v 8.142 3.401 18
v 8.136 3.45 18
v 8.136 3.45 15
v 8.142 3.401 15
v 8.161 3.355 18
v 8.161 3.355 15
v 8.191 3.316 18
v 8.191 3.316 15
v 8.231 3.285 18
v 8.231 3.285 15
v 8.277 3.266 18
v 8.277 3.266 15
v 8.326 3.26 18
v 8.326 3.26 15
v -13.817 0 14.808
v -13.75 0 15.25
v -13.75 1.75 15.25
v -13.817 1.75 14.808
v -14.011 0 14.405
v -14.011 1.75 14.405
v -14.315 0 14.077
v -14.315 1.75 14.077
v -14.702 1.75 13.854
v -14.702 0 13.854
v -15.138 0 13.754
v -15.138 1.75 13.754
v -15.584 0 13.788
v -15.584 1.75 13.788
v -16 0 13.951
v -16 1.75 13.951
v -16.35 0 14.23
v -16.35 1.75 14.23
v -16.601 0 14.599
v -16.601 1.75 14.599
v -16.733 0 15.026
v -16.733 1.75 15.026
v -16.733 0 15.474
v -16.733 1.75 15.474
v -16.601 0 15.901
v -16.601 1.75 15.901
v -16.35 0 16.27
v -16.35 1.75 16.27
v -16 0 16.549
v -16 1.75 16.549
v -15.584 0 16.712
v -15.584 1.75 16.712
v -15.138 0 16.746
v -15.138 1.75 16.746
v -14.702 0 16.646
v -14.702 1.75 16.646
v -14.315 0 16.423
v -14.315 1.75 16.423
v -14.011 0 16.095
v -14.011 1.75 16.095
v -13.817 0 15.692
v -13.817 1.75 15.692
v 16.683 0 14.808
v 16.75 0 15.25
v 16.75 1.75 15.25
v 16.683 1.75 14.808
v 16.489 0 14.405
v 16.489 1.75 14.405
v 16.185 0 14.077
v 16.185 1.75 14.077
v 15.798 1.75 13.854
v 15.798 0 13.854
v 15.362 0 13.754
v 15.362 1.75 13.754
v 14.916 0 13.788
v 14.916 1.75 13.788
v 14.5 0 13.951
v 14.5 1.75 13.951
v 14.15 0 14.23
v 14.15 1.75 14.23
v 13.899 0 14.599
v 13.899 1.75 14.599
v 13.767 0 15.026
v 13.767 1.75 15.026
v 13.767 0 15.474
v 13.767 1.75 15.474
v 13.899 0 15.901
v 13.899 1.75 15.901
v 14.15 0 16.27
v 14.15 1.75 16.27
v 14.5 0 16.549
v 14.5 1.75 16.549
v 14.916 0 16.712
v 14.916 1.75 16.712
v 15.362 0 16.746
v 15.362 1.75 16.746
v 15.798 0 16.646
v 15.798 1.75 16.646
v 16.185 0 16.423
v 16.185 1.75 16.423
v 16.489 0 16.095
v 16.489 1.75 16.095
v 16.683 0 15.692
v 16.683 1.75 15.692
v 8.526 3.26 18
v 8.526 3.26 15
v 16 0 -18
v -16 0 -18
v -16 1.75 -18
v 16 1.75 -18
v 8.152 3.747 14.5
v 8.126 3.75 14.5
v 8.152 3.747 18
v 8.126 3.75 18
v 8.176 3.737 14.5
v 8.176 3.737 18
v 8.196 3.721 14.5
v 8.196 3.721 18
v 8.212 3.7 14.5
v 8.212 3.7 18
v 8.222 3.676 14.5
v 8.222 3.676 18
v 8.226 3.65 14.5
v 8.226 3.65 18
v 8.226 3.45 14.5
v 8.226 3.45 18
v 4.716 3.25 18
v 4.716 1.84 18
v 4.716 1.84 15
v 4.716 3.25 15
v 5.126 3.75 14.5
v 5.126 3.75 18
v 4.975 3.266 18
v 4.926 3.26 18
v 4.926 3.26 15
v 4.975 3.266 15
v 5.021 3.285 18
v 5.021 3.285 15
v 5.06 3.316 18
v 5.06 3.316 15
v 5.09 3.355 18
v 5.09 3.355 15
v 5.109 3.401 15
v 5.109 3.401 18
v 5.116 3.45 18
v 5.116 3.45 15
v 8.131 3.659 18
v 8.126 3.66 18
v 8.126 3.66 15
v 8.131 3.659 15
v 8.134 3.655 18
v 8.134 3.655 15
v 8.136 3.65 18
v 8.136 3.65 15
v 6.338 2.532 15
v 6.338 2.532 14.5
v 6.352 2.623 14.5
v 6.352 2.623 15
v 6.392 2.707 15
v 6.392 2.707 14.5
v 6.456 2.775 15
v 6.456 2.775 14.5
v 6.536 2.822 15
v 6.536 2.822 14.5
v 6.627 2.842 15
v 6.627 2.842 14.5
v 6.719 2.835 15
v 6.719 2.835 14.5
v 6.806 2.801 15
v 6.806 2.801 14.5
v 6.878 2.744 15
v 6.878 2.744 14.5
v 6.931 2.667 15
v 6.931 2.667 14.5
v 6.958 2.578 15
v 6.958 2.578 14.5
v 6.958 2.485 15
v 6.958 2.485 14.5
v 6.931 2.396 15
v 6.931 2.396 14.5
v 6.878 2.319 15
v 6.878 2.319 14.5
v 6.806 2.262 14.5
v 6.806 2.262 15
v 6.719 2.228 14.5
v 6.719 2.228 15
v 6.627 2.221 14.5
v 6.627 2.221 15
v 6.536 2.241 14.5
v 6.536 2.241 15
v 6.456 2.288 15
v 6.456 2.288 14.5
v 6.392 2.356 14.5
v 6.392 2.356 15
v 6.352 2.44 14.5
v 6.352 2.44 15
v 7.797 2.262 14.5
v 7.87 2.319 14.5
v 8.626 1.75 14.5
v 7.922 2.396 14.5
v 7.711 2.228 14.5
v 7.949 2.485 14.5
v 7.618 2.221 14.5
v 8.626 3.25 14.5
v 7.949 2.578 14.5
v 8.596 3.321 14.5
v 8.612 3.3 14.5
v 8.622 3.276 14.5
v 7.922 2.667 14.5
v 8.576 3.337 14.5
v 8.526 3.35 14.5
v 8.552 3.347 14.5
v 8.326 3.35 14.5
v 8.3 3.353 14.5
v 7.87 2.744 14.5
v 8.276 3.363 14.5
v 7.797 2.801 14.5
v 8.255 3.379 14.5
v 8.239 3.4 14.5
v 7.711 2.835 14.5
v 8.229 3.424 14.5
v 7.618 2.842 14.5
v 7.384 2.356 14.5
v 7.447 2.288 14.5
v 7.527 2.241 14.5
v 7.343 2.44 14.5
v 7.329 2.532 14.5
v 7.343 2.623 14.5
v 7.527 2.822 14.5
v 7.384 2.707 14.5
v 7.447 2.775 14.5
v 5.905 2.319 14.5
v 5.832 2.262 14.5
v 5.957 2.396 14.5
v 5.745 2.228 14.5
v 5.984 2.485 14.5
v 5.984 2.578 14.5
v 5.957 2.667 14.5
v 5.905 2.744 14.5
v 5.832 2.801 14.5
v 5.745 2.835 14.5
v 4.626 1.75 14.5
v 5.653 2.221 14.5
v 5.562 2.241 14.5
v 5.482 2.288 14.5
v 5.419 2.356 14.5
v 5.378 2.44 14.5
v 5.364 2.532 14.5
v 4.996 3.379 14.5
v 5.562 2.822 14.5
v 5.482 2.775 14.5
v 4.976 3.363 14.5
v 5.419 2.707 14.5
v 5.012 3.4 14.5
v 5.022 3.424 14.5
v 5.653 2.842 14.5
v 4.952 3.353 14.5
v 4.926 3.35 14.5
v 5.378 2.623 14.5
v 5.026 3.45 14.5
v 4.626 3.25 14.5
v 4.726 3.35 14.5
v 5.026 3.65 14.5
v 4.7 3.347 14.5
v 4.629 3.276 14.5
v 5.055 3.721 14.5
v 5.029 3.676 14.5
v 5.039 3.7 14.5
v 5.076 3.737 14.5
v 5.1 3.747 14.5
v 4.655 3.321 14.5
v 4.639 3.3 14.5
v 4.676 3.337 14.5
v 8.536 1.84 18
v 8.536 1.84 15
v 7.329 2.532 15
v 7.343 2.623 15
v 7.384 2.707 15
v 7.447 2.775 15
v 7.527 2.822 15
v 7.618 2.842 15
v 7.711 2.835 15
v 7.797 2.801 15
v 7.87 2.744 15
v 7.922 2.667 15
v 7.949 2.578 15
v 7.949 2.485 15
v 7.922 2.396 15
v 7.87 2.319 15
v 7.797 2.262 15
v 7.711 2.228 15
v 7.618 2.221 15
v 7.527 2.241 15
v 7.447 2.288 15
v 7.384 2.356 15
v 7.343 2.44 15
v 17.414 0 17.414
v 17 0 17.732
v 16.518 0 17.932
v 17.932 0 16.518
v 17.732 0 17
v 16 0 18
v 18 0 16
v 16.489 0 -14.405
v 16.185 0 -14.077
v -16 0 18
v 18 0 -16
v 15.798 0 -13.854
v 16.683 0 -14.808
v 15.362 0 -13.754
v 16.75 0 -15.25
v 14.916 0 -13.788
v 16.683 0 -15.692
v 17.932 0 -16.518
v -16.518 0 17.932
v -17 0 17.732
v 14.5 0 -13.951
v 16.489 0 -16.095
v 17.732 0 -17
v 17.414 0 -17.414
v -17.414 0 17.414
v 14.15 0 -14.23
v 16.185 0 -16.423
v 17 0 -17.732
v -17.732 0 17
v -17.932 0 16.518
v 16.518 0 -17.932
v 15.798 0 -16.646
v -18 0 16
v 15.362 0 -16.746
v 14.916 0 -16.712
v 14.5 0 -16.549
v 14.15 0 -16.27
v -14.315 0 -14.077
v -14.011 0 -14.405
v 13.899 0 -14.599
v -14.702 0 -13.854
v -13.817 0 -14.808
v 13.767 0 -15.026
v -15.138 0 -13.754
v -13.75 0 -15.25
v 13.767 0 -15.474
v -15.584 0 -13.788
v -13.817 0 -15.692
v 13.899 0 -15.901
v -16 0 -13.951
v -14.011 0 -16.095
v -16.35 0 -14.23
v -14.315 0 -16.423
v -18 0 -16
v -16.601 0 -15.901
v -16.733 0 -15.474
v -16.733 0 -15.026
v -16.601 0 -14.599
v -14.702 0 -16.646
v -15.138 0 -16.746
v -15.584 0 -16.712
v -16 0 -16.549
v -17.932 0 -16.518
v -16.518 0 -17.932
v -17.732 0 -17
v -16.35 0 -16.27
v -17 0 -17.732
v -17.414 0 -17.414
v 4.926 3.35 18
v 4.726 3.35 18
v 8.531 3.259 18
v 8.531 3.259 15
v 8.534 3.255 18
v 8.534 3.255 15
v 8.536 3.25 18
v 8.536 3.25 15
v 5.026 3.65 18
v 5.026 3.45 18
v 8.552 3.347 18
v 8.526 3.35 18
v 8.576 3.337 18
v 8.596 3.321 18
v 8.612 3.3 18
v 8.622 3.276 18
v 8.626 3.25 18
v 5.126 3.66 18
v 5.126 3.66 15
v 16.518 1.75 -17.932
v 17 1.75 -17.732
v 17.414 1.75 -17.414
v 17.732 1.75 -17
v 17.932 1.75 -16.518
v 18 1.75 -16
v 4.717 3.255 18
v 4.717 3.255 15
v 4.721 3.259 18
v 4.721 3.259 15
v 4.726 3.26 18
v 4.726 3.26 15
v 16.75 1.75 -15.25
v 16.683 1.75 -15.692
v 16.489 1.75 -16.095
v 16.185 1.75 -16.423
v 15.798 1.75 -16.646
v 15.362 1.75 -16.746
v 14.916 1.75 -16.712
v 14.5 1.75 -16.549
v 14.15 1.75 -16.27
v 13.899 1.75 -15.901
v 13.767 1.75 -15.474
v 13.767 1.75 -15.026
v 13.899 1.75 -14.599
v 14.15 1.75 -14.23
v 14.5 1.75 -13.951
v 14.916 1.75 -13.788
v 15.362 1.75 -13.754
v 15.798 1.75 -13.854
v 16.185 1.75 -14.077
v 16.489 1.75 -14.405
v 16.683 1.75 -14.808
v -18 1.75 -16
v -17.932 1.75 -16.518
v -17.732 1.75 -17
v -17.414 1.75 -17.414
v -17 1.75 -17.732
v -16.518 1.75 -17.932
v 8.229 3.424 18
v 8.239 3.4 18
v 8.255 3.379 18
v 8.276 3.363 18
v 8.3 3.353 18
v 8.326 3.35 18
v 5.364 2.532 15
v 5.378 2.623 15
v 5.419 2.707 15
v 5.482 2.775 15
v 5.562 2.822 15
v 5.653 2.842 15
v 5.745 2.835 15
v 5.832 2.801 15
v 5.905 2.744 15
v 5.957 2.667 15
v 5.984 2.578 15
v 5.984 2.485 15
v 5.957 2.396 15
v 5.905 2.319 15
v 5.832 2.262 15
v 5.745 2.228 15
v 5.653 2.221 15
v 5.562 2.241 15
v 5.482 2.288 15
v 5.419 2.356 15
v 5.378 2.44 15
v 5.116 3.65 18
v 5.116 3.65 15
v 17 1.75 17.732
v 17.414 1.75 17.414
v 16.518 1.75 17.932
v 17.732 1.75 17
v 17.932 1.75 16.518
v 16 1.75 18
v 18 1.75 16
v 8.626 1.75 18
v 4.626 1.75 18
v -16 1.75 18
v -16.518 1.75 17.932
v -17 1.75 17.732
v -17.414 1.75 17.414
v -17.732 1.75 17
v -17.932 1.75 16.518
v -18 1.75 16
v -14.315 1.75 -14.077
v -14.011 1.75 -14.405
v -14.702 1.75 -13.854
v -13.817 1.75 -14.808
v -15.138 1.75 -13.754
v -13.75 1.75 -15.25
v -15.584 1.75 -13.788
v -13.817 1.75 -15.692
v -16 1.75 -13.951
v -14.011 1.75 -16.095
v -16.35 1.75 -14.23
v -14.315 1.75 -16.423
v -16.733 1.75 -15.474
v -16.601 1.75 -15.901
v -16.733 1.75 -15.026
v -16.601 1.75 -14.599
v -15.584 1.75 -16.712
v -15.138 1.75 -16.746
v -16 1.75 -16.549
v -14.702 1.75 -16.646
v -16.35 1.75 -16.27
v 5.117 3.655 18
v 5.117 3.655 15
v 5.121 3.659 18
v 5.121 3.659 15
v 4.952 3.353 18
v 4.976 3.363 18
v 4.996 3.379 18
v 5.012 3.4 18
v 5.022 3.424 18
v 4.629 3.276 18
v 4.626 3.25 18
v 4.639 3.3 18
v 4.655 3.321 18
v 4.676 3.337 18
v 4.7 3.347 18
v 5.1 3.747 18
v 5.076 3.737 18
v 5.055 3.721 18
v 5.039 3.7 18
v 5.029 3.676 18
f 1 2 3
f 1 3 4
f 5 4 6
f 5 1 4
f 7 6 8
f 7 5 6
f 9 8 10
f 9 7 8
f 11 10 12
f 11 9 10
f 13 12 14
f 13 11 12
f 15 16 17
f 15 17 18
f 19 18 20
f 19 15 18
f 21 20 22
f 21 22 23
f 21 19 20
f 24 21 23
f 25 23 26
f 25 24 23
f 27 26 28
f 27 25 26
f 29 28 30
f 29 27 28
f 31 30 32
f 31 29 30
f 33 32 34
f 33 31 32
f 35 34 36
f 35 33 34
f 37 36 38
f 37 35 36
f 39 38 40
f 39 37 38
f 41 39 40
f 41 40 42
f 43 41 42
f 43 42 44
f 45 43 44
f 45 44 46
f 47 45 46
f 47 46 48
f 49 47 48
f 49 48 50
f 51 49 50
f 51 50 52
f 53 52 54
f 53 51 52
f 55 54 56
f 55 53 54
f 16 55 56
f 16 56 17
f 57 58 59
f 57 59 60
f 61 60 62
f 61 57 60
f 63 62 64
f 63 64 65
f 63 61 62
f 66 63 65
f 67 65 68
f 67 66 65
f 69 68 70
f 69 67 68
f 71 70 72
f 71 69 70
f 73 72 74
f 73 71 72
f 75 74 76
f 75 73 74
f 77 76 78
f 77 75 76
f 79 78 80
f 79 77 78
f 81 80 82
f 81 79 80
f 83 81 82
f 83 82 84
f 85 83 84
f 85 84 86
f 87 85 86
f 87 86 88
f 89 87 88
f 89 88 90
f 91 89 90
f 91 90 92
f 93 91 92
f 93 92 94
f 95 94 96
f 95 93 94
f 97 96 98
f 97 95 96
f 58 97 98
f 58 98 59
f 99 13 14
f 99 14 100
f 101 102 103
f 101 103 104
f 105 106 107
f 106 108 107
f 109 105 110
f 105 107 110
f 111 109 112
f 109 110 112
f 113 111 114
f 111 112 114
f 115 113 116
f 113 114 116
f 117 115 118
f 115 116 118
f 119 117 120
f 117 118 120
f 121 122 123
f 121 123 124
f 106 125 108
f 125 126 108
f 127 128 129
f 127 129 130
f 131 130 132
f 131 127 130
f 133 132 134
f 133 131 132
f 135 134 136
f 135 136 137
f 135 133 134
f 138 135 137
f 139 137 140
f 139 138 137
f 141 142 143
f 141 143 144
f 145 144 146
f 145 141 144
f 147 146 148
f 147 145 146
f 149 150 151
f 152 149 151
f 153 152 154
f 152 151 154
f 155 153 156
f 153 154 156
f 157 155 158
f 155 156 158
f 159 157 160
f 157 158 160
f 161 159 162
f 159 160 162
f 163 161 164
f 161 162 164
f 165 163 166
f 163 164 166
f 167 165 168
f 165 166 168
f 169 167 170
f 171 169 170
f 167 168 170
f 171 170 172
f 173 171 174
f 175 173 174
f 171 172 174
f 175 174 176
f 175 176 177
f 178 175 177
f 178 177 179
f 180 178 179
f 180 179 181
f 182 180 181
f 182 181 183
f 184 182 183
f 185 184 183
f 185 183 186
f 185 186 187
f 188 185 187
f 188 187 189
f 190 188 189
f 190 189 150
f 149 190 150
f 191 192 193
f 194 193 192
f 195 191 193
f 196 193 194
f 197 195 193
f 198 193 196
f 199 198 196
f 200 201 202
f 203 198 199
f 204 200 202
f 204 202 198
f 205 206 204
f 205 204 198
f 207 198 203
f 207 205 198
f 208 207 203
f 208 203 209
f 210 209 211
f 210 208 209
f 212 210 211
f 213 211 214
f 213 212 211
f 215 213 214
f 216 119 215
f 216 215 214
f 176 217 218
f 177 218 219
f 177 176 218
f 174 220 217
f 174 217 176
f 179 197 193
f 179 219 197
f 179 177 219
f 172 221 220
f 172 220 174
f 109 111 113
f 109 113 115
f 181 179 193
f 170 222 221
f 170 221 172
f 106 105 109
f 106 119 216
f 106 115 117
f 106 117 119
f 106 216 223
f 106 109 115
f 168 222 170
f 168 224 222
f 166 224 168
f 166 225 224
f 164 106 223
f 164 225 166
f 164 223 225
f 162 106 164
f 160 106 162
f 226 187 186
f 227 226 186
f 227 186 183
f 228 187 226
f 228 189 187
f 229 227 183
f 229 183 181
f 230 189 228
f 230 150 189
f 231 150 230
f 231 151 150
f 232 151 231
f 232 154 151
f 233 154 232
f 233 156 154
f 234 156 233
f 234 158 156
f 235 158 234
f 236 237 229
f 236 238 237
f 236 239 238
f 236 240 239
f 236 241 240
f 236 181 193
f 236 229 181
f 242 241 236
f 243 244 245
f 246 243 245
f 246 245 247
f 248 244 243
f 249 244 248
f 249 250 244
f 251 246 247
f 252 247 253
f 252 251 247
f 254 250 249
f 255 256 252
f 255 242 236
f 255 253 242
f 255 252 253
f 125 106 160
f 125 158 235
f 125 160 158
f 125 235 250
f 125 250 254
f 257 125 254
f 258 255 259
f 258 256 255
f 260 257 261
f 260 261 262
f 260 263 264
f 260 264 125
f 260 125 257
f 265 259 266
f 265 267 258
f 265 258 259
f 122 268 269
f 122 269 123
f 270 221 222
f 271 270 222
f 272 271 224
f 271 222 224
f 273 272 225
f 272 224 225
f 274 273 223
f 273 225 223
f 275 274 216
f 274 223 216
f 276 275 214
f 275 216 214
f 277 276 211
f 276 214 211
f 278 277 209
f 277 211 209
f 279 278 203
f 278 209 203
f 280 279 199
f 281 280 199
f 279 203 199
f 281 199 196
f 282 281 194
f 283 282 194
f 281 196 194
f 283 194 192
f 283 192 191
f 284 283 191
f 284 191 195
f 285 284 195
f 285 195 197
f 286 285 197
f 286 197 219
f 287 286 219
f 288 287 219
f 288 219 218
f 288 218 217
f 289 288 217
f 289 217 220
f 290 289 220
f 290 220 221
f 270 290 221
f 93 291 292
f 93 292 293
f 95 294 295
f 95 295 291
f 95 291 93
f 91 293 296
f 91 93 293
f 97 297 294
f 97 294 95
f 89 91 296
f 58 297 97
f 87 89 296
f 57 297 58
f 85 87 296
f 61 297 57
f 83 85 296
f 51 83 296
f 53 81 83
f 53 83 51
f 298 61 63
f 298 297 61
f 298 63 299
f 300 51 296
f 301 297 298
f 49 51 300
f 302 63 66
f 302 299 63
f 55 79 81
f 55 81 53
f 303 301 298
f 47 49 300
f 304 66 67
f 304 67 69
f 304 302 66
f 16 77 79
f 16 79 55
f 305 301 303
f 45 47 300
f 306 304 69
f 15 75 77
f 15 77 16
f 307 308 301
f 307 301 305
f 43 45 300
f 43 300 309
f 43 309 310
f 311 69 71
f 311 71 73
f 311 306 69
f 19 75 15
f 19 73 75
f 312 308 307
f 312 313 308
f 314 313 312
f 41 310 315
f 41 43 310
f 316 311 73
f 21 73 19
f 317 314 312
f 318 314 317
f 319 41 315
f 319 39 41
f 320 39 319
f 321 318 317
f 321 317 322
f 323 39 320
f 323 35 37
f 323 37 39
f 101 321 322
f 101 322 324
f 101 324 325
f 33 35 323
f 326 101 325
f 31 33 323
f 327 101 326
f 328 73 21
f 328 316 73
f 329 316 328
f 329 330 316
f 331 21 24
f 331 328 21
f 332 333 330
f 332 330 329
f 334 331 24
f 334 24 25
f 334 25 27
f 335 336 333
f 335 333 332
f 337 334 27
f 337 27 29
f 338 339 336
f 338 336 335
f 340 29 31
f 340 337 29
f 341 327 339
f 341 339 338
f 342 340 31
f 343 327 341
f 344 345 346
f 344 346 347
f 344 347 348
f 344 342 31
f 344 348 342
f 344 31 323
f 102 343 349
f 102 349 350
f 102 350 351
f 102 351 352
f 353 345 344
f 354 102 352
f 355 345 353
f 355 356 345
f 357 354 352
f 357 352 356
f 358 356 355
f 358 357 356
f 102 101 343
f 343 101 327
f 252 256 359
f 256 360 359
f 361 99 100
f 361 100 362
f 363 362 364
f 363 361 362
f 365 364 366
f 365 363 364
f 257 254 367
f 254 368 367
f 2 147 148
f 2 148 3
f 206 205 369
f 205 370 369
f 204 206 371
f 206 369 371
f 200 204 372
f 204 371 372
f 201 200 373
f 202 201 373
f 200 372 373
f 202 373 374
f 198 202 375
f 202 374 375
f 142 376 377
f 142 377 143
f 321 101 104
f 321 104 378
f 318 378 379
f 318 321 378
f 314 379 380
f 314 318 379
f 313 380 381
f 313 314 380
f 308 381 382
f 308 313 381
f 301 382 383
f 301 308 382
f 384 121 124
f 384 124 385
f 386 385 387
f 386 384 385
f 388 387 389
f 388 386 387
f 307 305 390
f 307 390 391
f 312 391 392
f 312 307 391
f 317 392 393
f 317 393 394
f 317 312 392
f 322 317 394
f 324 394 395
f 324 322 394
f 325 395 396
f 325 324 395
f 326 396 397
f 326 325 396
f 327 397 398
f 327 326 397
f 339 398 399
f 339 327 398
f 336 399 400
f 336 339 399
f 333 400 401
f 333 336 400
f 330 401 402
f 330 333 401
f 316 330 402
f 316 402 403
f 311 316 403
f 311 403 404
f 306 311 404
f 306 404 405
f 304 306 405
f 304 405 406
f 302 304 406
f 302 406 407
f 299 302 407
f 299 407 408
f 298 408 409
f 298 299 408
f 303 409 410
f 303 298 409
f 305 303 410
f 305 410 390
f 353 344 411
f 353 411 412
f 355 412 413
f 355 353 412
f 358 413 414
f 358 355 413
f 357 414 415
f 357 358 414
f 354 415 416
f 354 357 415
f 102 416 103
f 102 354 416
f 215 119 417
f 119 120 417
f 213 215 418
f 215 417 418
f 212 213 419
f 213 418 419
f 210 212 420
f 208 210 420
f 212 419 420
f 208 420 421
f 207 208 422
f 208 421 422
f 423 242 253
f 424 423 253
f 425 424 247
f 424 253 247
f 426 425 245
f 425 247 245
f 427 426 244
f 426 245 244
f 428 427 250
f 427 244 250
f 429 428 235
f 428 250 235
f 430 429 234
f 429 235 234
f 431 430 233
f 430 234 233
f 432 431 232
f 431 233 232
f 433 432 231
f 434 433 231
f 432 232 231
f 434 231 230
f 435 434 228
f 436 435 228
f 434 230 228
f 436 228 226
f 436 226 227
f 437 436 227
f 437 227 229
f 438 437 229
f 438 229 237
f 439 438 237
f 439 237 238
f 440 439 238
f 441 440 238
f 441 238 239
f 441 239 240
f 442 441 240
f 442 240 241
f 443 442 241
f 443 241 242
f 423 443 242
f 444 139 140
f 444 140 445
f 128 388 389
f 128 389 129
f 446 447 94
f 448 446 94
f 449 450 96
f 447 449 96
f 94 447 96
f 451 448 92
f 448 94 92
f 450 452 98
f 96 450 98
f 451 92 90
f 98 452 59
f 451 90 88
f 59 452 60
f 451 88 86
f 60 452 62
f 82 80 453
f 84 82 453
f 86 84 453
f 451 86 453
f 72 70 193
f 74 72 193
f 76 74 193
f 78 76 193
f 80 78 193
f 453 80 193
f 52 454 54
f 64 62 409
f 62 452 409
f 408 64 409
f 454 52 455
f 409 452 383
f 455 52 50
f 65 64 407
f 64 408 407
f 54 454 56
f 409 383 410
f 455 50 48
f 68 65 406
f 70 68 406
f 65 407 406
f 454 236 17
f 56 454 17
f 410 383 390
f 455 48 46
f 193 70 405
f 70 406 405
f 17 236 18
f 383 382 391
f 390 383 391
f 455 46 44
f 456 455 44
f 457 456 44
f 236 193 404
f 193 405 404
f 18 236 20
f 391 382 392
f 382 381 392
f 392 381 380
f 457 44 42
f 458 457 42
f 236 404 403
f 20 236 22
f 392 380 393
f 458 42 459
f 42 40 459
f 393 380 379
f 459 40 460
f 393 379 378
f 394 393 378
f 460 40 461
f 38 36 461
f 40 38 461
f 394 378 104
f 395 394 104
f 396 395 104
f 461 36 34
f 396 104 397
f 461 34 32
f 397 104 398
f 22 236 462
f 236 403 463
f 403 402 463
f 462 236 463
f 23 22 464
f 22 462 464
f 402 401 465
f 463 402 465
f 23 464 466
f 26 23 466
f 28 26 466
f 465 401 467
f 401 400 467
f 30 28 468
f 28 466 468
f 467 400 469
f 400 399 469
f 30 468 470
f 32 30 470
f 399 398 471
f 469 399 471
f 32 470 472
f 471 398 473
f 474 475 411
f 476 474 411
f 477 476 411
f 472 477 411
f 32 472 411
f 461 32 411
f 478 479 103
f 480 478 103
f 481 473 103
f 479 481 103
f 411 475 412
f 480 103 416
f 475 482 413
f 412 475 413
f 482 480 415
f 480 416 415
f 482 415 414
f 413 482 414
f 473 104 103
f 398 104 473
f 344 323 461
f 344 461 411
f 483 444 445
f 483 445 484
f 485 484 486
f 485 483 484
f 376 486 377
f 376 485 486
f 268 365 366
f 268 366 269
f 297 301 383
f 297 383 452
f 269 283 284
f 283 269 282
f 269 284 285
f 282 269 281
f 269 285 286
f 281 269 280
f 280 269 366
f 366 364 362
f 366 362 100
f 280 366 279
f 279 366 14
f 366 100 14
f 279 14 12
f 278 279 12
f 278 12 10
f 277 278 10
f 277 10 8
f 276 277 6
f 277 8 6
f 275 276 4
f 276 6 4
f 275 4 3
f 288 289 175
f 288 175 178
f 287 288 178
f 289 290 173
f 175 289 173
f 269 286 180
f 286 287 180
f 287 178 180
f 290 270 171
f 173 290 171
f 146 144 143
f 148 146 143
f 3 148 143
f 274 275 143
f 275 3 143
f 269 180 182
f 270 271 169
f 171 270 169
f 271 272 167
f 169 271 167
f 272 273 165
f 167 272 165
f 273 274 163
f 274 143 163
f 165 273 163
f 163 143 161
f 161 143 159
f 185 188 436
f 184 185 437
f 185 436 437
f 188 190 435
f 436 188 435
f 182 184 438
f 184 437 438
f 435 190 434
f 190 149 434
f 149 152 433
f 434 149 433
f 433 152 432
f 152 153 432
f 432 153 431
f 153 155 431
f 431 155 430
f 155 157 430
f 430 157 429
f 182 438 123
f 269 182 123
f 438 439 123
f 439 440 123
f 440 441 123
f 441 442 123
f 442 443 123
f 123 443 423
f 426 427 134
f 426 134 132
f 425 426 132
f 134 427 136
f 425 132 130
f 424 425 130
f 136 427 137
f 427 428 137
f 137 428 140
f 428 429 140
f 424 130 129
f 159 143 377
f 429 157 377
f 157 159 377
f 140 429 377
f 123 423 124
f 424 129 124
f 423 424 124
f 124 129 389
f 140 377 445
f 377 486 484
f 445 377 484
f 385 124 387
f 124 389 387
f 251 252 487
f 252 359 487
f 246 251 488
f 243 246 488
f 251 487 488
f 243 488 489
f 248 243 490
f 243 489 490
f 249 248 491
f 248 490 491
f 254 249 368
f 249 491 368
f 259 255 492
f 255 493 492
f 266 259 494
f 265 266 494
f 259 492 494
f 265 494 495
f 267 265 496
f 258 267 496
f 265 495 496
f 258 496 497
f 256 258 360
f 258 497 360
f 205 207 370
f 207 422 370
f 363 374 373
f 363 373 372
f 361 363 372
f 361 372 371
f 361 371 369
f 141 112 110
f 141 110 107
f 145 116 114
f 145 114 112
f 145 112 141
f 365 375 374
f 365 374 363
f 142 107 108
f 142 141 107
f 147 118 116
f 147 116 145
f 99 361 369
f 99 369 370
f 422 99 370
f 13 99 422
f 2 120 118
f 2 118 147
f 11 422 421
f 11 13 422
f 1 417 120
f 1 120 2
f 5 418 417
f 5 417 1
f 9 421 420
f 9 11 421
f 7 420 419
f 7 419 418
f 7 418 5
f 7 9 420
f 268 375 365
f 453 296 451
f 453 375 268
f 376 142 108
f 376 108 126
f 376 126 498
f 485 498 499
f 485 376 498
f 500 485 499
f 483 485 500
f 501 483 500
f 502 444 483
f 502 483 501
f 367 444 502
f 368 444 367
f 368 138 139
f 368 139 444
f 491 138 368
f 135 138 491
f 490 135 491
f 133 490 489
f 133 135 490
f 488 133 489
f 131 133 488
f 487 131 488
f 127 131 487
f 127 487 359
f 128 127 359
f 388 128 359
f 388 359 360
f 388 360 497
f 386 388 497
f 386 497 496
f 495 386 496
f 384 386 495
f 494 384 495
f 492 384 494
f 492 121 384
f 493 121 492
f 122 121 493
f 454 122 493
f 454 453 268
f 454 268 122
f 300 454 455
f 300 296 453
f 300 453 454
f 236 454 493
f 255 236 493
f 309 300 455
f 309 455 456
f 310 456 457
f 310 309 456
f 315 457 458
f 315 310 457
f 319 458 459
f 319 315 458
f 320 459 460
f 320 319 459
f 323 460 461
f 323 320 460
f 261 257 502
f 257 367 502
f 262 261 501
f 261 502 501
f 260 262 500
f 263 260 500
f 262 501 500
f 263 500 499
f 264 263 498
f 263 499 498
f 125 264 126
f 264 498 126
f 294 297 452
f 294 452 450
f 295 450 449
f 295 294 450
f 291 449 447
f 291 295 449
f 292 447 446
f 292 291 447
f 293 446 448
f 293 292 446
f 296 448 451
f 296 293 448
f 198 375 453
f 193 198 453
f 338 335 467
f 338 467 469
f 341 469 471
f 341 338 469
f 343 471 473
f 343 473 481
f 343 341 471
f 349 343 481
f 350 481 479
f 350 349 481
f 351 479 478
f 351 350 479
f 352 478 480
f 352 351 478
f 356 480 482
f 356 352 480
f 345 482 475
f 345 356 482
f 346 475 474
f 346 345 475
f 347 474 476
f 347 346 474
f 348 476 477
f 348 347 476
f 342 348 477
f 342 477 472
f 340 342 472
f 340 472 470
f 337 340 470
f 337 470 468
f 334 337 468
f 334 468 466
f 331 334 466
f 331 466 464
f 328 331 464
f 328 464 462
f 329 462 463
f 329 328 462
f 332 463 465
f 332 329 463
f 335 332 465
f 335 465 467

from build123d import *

# Parameters (mm, degrees)
SKETCH1_R           = 1.5
BOSS_EXTRUDE1_DEPTH = 1.75
BOSS_EXTRUDE2_DEPTH = 3
BOSS_EXTRUDE3_DEPTH = 0.5
CUT_EXTRUDE1_REACH  = 5.5
SKETCH4_R           = 0.311736168


with BuildPart() as part:
    # Sketch1 → Boss-Extrude1 (new body)
    with BuildSketch(Plane(origin=(0, 0, 0), x_dir=(1, 0, 0), z_dir=(0, 1, 0))):
        with BuildLine():
            Line((16, -18), (-16, -18))
            ThreePointArc((-16, -18), (-17.414213562, -17.414213562), (-18, -16))
            Line((-18, -16), (-18, 16))
            ThreePointArc((-18, 16), (-17.414213562, 17.414213562), (-16, 18))
            Line((-16, 18), (16, 18))
            ThreePointArc((16, 18), (17.414213562, 17.414213562), (18, 16))
            Line((18, 16), (18, -16))
            ThreePointArc((18, -16), (17.414213562, -17.414213562), (16, -18))
        make_face()
        with Locations((15.25, 15.25)):
            Circle(SKETCH1_R, mode=Mode.SUBTRACT)
        with Locations((-15.25, 15.25)):
            Circle(SKETCH1_R, mode=Mode.SUBTRACT)
        with Locations((15.25, -15.25)):
            Circle(SKETCH1_R, mode=Mode.SUBTRACT)
        with Locations((-15.25, -15.25)):
            Circle(SKETCH1_R, mode=Mode.SUBTRACT)
    extrude(amount=BOSS_EXTRUDE1_DEPTH)

    # Sketch2 → Boss-Extrude2 (add)
    with BuildSketch(Plane.XY.offset(18)):
        with BuildLine():
            Line((4.625773415, 1.75), (8.625773415, 1.75))
            Line((8.625773415, 1.75), (8.625773415, 3.25))
            ThreePointArc((8.625773415, 3.25), (8.596484093, 3.320710678), (8.525773415, 3.35))
            Line((8.525773415, 3.35), (8.325773415, 3.35))
            ThreePointArc((8.325773415, 3.35), (8.255062737, 3.379289322), (8.225773415, 3.45))
            Line((8.225773415, 3.45), (8.225773415, 3.65))
            ThreePointArc((8.225773415, 3.65), (8.196484093, 3.720710678), (8.125773415, 3.75))
            Line((8.125773415, 3.75), (5.125773415, 3.75))
            ThreePointArc((5.125773415, 3.75), (5.055062737, 3.720710678), (5.025773415, 3.65))
            Line((5.025773415, 3.65), (5.025773415, 3.45))
            ThreePointArc((5.025773415, 3.45), (4.996484093, 3.379289322), (4.925773415, 3.35))
            Line((4.925773415, 3.35), (4.725773415, 3.35))
            ThreePointArc((4.725773415, 3.35), (4.655062737, 3.320710678), (4.625773415, 3.25))
            Line((4.625773415, 3.25), (4.625773415, 1.75))
        make_face()
        with BuildLine():
            Line((5.125773415, 3.66), (8.125773415, 3.66))
            ThreePointArc((8.125773415, 3.66), (8.132844483, 3.657071068), (8.135773415, 3.65))
            Line((8.135773415, 3.65), (8.135773415, 3.45))
            ThreePointArc((8.135773415, 3.45), (8.191423127, 3.315649712), (8.325773415, 3.26))
            Line((8.325773415, 3.26), (8.525773415, 3.26))
            ThreePointArc((8.525773415, 3.26), (8.532844483, 3.257071068), (8.535773415, 3.25))
            Line((8.535773415, 3.25), (8.535773415, 1.84))
            Line((8.535773415, 1.84), (4.715773415, 1.84))
            Line((4.715773415, 1.84), (4.715773415, 3.25))
            ThreePointArc((4.715773415, 3.25), (4.718702348, 3.257071068), (4.725773415, 3.26))
            Line((4.725773415, 3.26), (4.925773415, 3.26))
            ThreePointArc((4.925773415, 3.26), (5.060123704, 3.315649712), (5.115773415, 3.45))
            Line((5.115773415, 3.45), (5.115773415, 3.65))
            ThreePointArc((5.115773415, 3.65), (5.118702348, 3.657071068), (5.125773415, 3.66))
        make_face(mode=Mode.SUBTRACT)
    extrude(amount=-BOSS_EXTRUDE2_DEPTH)

    # Sketch3 → Boss-Extrude3 (add)
    with BuildSketch(Plane(origin=(0, 0, 15), x_dir=(-1, 0, 0), z_dir=(0, 0, -1))):
        with BuildLine():
            Line((-4.625773415, 1.75), (-4.625773415, 3.25))
            ThreePointArc((-4.625773415, 3.25), (-4.655062737, 3.320710678), (-4.725773415, 3.35))
            Line((-4.725773415, 3.35), (-4.925773415, 3.35))
            ThreePointArc((-4.925773415, 3.35), (-4.996484093, 3.379289322), (-5.025773415, 3.45))
            Line((-5.025773415, 3.45), (-5.025773415, 3.65))
            ThreePointArc((-5.025773415, 3.65), (-5.055062737, 3.720710678), (-5.125773415, 3.75))
            Line((-5.125773415, 3.75), (-8.125773415, 3.75))
            ThreePointArc((-8.125773415, 3.75), (-8.196484093, 3.720710678), (-8.225773415, 3.65))
            Line((-8.225773415, 3.65), (-8.225773415, 3.45))
            ThreePointArc((-8.225773415, 3.45), (-8.255062737, 3.379289322), (-8.325773415, 3.35))
            Line((-8.325773415, 3.35), (-8.525773415, 3.35))
            ThreePointArc((-8.525773415, 3.35), (-8.596484093, 3.320710678), (-8.625773415, 3.25))
            Line((-8.625773415, 3.25), (-8.625773415, 1.75))
            Line((-8.625773415, 1.75), (-4.625773415, 1.75))
        make_face()
    extrude(amount=BOSS_EXTRUDE3_DEPTH)

    # Sketch4 → Cut-Extrude1 (cut, up to next)
    with BuildSketch(Plane(origin=(0, 0, 14.5), x_dir=(-1, 0, 0), z_dir=(0, 0, -1)), mode=Mode.PRIVATE) as cut_extrude1_sk1:
        with Locations((-5.676091673, 2.531528256)):
            Circle(SKETCH4_R)
    cut_extrude1_tool1 = extrude(cut_extrude1_sk1.sketch, amount=-CUT_EXTRUDE1_REACH, mode=Mode.PRIVATE) & part.part
    add(cut_extrude1_tool1.solids().sort_by_distance((5.676092, 2.531528, 14.5))[0], mode=Mode.SUBTRACT)
    # Sketch4 → Cut-Extrude1 (cut, up to next)
    with BuildSketch(Plane(origin=(0, 0, 14.5), x_dir=(-1, 0, 0), z_dir=(0, 0, -1)), mode=Mode.PRIVATE) as cut_extrude1_sk2:
        with Locations((-7.641197668, 2.531528256)):
            Circle(SKETCH4_R)
    cut_extrude1_tool2 = extrude(cut_extrude1_sk2.sketch, amount=-CUT_EXTRUDE1_REACH, mode=Mode.PRIVATE) & part.part
    add(cut_extrude1_tool2.solids().sort_by_distance((7.641198, 2.531528, 14.5))[0], mode=Mode.SUBTRACT)
    # Sketch4 → Cut-Extrude1 (cut, up to next)
    with BuildSketch(Plane(origin=(0, 0, 14.5), x_dir=(-1, 0, 0), z_dir=(0, 0, -1)), mode=Mode.PRIVATE) as cut_extrude1_sk3:
        with Locations((-6.649897908, 2.531528256)):
            Circle(SKETCH4_R)
    cut_extrude1_tool3 = extrude(cut_extrude1_sk3.sketch, amount=-CUT_EXTRUDE1_REACH, mode=Mode.PRIVATE) & part.part
    add(cut_extrude1_tool3.solids().sort_by_distance((6.649898, 2.531528, 14.5))[0], mode=Mode.SUBTRACT)


solid = part.part
